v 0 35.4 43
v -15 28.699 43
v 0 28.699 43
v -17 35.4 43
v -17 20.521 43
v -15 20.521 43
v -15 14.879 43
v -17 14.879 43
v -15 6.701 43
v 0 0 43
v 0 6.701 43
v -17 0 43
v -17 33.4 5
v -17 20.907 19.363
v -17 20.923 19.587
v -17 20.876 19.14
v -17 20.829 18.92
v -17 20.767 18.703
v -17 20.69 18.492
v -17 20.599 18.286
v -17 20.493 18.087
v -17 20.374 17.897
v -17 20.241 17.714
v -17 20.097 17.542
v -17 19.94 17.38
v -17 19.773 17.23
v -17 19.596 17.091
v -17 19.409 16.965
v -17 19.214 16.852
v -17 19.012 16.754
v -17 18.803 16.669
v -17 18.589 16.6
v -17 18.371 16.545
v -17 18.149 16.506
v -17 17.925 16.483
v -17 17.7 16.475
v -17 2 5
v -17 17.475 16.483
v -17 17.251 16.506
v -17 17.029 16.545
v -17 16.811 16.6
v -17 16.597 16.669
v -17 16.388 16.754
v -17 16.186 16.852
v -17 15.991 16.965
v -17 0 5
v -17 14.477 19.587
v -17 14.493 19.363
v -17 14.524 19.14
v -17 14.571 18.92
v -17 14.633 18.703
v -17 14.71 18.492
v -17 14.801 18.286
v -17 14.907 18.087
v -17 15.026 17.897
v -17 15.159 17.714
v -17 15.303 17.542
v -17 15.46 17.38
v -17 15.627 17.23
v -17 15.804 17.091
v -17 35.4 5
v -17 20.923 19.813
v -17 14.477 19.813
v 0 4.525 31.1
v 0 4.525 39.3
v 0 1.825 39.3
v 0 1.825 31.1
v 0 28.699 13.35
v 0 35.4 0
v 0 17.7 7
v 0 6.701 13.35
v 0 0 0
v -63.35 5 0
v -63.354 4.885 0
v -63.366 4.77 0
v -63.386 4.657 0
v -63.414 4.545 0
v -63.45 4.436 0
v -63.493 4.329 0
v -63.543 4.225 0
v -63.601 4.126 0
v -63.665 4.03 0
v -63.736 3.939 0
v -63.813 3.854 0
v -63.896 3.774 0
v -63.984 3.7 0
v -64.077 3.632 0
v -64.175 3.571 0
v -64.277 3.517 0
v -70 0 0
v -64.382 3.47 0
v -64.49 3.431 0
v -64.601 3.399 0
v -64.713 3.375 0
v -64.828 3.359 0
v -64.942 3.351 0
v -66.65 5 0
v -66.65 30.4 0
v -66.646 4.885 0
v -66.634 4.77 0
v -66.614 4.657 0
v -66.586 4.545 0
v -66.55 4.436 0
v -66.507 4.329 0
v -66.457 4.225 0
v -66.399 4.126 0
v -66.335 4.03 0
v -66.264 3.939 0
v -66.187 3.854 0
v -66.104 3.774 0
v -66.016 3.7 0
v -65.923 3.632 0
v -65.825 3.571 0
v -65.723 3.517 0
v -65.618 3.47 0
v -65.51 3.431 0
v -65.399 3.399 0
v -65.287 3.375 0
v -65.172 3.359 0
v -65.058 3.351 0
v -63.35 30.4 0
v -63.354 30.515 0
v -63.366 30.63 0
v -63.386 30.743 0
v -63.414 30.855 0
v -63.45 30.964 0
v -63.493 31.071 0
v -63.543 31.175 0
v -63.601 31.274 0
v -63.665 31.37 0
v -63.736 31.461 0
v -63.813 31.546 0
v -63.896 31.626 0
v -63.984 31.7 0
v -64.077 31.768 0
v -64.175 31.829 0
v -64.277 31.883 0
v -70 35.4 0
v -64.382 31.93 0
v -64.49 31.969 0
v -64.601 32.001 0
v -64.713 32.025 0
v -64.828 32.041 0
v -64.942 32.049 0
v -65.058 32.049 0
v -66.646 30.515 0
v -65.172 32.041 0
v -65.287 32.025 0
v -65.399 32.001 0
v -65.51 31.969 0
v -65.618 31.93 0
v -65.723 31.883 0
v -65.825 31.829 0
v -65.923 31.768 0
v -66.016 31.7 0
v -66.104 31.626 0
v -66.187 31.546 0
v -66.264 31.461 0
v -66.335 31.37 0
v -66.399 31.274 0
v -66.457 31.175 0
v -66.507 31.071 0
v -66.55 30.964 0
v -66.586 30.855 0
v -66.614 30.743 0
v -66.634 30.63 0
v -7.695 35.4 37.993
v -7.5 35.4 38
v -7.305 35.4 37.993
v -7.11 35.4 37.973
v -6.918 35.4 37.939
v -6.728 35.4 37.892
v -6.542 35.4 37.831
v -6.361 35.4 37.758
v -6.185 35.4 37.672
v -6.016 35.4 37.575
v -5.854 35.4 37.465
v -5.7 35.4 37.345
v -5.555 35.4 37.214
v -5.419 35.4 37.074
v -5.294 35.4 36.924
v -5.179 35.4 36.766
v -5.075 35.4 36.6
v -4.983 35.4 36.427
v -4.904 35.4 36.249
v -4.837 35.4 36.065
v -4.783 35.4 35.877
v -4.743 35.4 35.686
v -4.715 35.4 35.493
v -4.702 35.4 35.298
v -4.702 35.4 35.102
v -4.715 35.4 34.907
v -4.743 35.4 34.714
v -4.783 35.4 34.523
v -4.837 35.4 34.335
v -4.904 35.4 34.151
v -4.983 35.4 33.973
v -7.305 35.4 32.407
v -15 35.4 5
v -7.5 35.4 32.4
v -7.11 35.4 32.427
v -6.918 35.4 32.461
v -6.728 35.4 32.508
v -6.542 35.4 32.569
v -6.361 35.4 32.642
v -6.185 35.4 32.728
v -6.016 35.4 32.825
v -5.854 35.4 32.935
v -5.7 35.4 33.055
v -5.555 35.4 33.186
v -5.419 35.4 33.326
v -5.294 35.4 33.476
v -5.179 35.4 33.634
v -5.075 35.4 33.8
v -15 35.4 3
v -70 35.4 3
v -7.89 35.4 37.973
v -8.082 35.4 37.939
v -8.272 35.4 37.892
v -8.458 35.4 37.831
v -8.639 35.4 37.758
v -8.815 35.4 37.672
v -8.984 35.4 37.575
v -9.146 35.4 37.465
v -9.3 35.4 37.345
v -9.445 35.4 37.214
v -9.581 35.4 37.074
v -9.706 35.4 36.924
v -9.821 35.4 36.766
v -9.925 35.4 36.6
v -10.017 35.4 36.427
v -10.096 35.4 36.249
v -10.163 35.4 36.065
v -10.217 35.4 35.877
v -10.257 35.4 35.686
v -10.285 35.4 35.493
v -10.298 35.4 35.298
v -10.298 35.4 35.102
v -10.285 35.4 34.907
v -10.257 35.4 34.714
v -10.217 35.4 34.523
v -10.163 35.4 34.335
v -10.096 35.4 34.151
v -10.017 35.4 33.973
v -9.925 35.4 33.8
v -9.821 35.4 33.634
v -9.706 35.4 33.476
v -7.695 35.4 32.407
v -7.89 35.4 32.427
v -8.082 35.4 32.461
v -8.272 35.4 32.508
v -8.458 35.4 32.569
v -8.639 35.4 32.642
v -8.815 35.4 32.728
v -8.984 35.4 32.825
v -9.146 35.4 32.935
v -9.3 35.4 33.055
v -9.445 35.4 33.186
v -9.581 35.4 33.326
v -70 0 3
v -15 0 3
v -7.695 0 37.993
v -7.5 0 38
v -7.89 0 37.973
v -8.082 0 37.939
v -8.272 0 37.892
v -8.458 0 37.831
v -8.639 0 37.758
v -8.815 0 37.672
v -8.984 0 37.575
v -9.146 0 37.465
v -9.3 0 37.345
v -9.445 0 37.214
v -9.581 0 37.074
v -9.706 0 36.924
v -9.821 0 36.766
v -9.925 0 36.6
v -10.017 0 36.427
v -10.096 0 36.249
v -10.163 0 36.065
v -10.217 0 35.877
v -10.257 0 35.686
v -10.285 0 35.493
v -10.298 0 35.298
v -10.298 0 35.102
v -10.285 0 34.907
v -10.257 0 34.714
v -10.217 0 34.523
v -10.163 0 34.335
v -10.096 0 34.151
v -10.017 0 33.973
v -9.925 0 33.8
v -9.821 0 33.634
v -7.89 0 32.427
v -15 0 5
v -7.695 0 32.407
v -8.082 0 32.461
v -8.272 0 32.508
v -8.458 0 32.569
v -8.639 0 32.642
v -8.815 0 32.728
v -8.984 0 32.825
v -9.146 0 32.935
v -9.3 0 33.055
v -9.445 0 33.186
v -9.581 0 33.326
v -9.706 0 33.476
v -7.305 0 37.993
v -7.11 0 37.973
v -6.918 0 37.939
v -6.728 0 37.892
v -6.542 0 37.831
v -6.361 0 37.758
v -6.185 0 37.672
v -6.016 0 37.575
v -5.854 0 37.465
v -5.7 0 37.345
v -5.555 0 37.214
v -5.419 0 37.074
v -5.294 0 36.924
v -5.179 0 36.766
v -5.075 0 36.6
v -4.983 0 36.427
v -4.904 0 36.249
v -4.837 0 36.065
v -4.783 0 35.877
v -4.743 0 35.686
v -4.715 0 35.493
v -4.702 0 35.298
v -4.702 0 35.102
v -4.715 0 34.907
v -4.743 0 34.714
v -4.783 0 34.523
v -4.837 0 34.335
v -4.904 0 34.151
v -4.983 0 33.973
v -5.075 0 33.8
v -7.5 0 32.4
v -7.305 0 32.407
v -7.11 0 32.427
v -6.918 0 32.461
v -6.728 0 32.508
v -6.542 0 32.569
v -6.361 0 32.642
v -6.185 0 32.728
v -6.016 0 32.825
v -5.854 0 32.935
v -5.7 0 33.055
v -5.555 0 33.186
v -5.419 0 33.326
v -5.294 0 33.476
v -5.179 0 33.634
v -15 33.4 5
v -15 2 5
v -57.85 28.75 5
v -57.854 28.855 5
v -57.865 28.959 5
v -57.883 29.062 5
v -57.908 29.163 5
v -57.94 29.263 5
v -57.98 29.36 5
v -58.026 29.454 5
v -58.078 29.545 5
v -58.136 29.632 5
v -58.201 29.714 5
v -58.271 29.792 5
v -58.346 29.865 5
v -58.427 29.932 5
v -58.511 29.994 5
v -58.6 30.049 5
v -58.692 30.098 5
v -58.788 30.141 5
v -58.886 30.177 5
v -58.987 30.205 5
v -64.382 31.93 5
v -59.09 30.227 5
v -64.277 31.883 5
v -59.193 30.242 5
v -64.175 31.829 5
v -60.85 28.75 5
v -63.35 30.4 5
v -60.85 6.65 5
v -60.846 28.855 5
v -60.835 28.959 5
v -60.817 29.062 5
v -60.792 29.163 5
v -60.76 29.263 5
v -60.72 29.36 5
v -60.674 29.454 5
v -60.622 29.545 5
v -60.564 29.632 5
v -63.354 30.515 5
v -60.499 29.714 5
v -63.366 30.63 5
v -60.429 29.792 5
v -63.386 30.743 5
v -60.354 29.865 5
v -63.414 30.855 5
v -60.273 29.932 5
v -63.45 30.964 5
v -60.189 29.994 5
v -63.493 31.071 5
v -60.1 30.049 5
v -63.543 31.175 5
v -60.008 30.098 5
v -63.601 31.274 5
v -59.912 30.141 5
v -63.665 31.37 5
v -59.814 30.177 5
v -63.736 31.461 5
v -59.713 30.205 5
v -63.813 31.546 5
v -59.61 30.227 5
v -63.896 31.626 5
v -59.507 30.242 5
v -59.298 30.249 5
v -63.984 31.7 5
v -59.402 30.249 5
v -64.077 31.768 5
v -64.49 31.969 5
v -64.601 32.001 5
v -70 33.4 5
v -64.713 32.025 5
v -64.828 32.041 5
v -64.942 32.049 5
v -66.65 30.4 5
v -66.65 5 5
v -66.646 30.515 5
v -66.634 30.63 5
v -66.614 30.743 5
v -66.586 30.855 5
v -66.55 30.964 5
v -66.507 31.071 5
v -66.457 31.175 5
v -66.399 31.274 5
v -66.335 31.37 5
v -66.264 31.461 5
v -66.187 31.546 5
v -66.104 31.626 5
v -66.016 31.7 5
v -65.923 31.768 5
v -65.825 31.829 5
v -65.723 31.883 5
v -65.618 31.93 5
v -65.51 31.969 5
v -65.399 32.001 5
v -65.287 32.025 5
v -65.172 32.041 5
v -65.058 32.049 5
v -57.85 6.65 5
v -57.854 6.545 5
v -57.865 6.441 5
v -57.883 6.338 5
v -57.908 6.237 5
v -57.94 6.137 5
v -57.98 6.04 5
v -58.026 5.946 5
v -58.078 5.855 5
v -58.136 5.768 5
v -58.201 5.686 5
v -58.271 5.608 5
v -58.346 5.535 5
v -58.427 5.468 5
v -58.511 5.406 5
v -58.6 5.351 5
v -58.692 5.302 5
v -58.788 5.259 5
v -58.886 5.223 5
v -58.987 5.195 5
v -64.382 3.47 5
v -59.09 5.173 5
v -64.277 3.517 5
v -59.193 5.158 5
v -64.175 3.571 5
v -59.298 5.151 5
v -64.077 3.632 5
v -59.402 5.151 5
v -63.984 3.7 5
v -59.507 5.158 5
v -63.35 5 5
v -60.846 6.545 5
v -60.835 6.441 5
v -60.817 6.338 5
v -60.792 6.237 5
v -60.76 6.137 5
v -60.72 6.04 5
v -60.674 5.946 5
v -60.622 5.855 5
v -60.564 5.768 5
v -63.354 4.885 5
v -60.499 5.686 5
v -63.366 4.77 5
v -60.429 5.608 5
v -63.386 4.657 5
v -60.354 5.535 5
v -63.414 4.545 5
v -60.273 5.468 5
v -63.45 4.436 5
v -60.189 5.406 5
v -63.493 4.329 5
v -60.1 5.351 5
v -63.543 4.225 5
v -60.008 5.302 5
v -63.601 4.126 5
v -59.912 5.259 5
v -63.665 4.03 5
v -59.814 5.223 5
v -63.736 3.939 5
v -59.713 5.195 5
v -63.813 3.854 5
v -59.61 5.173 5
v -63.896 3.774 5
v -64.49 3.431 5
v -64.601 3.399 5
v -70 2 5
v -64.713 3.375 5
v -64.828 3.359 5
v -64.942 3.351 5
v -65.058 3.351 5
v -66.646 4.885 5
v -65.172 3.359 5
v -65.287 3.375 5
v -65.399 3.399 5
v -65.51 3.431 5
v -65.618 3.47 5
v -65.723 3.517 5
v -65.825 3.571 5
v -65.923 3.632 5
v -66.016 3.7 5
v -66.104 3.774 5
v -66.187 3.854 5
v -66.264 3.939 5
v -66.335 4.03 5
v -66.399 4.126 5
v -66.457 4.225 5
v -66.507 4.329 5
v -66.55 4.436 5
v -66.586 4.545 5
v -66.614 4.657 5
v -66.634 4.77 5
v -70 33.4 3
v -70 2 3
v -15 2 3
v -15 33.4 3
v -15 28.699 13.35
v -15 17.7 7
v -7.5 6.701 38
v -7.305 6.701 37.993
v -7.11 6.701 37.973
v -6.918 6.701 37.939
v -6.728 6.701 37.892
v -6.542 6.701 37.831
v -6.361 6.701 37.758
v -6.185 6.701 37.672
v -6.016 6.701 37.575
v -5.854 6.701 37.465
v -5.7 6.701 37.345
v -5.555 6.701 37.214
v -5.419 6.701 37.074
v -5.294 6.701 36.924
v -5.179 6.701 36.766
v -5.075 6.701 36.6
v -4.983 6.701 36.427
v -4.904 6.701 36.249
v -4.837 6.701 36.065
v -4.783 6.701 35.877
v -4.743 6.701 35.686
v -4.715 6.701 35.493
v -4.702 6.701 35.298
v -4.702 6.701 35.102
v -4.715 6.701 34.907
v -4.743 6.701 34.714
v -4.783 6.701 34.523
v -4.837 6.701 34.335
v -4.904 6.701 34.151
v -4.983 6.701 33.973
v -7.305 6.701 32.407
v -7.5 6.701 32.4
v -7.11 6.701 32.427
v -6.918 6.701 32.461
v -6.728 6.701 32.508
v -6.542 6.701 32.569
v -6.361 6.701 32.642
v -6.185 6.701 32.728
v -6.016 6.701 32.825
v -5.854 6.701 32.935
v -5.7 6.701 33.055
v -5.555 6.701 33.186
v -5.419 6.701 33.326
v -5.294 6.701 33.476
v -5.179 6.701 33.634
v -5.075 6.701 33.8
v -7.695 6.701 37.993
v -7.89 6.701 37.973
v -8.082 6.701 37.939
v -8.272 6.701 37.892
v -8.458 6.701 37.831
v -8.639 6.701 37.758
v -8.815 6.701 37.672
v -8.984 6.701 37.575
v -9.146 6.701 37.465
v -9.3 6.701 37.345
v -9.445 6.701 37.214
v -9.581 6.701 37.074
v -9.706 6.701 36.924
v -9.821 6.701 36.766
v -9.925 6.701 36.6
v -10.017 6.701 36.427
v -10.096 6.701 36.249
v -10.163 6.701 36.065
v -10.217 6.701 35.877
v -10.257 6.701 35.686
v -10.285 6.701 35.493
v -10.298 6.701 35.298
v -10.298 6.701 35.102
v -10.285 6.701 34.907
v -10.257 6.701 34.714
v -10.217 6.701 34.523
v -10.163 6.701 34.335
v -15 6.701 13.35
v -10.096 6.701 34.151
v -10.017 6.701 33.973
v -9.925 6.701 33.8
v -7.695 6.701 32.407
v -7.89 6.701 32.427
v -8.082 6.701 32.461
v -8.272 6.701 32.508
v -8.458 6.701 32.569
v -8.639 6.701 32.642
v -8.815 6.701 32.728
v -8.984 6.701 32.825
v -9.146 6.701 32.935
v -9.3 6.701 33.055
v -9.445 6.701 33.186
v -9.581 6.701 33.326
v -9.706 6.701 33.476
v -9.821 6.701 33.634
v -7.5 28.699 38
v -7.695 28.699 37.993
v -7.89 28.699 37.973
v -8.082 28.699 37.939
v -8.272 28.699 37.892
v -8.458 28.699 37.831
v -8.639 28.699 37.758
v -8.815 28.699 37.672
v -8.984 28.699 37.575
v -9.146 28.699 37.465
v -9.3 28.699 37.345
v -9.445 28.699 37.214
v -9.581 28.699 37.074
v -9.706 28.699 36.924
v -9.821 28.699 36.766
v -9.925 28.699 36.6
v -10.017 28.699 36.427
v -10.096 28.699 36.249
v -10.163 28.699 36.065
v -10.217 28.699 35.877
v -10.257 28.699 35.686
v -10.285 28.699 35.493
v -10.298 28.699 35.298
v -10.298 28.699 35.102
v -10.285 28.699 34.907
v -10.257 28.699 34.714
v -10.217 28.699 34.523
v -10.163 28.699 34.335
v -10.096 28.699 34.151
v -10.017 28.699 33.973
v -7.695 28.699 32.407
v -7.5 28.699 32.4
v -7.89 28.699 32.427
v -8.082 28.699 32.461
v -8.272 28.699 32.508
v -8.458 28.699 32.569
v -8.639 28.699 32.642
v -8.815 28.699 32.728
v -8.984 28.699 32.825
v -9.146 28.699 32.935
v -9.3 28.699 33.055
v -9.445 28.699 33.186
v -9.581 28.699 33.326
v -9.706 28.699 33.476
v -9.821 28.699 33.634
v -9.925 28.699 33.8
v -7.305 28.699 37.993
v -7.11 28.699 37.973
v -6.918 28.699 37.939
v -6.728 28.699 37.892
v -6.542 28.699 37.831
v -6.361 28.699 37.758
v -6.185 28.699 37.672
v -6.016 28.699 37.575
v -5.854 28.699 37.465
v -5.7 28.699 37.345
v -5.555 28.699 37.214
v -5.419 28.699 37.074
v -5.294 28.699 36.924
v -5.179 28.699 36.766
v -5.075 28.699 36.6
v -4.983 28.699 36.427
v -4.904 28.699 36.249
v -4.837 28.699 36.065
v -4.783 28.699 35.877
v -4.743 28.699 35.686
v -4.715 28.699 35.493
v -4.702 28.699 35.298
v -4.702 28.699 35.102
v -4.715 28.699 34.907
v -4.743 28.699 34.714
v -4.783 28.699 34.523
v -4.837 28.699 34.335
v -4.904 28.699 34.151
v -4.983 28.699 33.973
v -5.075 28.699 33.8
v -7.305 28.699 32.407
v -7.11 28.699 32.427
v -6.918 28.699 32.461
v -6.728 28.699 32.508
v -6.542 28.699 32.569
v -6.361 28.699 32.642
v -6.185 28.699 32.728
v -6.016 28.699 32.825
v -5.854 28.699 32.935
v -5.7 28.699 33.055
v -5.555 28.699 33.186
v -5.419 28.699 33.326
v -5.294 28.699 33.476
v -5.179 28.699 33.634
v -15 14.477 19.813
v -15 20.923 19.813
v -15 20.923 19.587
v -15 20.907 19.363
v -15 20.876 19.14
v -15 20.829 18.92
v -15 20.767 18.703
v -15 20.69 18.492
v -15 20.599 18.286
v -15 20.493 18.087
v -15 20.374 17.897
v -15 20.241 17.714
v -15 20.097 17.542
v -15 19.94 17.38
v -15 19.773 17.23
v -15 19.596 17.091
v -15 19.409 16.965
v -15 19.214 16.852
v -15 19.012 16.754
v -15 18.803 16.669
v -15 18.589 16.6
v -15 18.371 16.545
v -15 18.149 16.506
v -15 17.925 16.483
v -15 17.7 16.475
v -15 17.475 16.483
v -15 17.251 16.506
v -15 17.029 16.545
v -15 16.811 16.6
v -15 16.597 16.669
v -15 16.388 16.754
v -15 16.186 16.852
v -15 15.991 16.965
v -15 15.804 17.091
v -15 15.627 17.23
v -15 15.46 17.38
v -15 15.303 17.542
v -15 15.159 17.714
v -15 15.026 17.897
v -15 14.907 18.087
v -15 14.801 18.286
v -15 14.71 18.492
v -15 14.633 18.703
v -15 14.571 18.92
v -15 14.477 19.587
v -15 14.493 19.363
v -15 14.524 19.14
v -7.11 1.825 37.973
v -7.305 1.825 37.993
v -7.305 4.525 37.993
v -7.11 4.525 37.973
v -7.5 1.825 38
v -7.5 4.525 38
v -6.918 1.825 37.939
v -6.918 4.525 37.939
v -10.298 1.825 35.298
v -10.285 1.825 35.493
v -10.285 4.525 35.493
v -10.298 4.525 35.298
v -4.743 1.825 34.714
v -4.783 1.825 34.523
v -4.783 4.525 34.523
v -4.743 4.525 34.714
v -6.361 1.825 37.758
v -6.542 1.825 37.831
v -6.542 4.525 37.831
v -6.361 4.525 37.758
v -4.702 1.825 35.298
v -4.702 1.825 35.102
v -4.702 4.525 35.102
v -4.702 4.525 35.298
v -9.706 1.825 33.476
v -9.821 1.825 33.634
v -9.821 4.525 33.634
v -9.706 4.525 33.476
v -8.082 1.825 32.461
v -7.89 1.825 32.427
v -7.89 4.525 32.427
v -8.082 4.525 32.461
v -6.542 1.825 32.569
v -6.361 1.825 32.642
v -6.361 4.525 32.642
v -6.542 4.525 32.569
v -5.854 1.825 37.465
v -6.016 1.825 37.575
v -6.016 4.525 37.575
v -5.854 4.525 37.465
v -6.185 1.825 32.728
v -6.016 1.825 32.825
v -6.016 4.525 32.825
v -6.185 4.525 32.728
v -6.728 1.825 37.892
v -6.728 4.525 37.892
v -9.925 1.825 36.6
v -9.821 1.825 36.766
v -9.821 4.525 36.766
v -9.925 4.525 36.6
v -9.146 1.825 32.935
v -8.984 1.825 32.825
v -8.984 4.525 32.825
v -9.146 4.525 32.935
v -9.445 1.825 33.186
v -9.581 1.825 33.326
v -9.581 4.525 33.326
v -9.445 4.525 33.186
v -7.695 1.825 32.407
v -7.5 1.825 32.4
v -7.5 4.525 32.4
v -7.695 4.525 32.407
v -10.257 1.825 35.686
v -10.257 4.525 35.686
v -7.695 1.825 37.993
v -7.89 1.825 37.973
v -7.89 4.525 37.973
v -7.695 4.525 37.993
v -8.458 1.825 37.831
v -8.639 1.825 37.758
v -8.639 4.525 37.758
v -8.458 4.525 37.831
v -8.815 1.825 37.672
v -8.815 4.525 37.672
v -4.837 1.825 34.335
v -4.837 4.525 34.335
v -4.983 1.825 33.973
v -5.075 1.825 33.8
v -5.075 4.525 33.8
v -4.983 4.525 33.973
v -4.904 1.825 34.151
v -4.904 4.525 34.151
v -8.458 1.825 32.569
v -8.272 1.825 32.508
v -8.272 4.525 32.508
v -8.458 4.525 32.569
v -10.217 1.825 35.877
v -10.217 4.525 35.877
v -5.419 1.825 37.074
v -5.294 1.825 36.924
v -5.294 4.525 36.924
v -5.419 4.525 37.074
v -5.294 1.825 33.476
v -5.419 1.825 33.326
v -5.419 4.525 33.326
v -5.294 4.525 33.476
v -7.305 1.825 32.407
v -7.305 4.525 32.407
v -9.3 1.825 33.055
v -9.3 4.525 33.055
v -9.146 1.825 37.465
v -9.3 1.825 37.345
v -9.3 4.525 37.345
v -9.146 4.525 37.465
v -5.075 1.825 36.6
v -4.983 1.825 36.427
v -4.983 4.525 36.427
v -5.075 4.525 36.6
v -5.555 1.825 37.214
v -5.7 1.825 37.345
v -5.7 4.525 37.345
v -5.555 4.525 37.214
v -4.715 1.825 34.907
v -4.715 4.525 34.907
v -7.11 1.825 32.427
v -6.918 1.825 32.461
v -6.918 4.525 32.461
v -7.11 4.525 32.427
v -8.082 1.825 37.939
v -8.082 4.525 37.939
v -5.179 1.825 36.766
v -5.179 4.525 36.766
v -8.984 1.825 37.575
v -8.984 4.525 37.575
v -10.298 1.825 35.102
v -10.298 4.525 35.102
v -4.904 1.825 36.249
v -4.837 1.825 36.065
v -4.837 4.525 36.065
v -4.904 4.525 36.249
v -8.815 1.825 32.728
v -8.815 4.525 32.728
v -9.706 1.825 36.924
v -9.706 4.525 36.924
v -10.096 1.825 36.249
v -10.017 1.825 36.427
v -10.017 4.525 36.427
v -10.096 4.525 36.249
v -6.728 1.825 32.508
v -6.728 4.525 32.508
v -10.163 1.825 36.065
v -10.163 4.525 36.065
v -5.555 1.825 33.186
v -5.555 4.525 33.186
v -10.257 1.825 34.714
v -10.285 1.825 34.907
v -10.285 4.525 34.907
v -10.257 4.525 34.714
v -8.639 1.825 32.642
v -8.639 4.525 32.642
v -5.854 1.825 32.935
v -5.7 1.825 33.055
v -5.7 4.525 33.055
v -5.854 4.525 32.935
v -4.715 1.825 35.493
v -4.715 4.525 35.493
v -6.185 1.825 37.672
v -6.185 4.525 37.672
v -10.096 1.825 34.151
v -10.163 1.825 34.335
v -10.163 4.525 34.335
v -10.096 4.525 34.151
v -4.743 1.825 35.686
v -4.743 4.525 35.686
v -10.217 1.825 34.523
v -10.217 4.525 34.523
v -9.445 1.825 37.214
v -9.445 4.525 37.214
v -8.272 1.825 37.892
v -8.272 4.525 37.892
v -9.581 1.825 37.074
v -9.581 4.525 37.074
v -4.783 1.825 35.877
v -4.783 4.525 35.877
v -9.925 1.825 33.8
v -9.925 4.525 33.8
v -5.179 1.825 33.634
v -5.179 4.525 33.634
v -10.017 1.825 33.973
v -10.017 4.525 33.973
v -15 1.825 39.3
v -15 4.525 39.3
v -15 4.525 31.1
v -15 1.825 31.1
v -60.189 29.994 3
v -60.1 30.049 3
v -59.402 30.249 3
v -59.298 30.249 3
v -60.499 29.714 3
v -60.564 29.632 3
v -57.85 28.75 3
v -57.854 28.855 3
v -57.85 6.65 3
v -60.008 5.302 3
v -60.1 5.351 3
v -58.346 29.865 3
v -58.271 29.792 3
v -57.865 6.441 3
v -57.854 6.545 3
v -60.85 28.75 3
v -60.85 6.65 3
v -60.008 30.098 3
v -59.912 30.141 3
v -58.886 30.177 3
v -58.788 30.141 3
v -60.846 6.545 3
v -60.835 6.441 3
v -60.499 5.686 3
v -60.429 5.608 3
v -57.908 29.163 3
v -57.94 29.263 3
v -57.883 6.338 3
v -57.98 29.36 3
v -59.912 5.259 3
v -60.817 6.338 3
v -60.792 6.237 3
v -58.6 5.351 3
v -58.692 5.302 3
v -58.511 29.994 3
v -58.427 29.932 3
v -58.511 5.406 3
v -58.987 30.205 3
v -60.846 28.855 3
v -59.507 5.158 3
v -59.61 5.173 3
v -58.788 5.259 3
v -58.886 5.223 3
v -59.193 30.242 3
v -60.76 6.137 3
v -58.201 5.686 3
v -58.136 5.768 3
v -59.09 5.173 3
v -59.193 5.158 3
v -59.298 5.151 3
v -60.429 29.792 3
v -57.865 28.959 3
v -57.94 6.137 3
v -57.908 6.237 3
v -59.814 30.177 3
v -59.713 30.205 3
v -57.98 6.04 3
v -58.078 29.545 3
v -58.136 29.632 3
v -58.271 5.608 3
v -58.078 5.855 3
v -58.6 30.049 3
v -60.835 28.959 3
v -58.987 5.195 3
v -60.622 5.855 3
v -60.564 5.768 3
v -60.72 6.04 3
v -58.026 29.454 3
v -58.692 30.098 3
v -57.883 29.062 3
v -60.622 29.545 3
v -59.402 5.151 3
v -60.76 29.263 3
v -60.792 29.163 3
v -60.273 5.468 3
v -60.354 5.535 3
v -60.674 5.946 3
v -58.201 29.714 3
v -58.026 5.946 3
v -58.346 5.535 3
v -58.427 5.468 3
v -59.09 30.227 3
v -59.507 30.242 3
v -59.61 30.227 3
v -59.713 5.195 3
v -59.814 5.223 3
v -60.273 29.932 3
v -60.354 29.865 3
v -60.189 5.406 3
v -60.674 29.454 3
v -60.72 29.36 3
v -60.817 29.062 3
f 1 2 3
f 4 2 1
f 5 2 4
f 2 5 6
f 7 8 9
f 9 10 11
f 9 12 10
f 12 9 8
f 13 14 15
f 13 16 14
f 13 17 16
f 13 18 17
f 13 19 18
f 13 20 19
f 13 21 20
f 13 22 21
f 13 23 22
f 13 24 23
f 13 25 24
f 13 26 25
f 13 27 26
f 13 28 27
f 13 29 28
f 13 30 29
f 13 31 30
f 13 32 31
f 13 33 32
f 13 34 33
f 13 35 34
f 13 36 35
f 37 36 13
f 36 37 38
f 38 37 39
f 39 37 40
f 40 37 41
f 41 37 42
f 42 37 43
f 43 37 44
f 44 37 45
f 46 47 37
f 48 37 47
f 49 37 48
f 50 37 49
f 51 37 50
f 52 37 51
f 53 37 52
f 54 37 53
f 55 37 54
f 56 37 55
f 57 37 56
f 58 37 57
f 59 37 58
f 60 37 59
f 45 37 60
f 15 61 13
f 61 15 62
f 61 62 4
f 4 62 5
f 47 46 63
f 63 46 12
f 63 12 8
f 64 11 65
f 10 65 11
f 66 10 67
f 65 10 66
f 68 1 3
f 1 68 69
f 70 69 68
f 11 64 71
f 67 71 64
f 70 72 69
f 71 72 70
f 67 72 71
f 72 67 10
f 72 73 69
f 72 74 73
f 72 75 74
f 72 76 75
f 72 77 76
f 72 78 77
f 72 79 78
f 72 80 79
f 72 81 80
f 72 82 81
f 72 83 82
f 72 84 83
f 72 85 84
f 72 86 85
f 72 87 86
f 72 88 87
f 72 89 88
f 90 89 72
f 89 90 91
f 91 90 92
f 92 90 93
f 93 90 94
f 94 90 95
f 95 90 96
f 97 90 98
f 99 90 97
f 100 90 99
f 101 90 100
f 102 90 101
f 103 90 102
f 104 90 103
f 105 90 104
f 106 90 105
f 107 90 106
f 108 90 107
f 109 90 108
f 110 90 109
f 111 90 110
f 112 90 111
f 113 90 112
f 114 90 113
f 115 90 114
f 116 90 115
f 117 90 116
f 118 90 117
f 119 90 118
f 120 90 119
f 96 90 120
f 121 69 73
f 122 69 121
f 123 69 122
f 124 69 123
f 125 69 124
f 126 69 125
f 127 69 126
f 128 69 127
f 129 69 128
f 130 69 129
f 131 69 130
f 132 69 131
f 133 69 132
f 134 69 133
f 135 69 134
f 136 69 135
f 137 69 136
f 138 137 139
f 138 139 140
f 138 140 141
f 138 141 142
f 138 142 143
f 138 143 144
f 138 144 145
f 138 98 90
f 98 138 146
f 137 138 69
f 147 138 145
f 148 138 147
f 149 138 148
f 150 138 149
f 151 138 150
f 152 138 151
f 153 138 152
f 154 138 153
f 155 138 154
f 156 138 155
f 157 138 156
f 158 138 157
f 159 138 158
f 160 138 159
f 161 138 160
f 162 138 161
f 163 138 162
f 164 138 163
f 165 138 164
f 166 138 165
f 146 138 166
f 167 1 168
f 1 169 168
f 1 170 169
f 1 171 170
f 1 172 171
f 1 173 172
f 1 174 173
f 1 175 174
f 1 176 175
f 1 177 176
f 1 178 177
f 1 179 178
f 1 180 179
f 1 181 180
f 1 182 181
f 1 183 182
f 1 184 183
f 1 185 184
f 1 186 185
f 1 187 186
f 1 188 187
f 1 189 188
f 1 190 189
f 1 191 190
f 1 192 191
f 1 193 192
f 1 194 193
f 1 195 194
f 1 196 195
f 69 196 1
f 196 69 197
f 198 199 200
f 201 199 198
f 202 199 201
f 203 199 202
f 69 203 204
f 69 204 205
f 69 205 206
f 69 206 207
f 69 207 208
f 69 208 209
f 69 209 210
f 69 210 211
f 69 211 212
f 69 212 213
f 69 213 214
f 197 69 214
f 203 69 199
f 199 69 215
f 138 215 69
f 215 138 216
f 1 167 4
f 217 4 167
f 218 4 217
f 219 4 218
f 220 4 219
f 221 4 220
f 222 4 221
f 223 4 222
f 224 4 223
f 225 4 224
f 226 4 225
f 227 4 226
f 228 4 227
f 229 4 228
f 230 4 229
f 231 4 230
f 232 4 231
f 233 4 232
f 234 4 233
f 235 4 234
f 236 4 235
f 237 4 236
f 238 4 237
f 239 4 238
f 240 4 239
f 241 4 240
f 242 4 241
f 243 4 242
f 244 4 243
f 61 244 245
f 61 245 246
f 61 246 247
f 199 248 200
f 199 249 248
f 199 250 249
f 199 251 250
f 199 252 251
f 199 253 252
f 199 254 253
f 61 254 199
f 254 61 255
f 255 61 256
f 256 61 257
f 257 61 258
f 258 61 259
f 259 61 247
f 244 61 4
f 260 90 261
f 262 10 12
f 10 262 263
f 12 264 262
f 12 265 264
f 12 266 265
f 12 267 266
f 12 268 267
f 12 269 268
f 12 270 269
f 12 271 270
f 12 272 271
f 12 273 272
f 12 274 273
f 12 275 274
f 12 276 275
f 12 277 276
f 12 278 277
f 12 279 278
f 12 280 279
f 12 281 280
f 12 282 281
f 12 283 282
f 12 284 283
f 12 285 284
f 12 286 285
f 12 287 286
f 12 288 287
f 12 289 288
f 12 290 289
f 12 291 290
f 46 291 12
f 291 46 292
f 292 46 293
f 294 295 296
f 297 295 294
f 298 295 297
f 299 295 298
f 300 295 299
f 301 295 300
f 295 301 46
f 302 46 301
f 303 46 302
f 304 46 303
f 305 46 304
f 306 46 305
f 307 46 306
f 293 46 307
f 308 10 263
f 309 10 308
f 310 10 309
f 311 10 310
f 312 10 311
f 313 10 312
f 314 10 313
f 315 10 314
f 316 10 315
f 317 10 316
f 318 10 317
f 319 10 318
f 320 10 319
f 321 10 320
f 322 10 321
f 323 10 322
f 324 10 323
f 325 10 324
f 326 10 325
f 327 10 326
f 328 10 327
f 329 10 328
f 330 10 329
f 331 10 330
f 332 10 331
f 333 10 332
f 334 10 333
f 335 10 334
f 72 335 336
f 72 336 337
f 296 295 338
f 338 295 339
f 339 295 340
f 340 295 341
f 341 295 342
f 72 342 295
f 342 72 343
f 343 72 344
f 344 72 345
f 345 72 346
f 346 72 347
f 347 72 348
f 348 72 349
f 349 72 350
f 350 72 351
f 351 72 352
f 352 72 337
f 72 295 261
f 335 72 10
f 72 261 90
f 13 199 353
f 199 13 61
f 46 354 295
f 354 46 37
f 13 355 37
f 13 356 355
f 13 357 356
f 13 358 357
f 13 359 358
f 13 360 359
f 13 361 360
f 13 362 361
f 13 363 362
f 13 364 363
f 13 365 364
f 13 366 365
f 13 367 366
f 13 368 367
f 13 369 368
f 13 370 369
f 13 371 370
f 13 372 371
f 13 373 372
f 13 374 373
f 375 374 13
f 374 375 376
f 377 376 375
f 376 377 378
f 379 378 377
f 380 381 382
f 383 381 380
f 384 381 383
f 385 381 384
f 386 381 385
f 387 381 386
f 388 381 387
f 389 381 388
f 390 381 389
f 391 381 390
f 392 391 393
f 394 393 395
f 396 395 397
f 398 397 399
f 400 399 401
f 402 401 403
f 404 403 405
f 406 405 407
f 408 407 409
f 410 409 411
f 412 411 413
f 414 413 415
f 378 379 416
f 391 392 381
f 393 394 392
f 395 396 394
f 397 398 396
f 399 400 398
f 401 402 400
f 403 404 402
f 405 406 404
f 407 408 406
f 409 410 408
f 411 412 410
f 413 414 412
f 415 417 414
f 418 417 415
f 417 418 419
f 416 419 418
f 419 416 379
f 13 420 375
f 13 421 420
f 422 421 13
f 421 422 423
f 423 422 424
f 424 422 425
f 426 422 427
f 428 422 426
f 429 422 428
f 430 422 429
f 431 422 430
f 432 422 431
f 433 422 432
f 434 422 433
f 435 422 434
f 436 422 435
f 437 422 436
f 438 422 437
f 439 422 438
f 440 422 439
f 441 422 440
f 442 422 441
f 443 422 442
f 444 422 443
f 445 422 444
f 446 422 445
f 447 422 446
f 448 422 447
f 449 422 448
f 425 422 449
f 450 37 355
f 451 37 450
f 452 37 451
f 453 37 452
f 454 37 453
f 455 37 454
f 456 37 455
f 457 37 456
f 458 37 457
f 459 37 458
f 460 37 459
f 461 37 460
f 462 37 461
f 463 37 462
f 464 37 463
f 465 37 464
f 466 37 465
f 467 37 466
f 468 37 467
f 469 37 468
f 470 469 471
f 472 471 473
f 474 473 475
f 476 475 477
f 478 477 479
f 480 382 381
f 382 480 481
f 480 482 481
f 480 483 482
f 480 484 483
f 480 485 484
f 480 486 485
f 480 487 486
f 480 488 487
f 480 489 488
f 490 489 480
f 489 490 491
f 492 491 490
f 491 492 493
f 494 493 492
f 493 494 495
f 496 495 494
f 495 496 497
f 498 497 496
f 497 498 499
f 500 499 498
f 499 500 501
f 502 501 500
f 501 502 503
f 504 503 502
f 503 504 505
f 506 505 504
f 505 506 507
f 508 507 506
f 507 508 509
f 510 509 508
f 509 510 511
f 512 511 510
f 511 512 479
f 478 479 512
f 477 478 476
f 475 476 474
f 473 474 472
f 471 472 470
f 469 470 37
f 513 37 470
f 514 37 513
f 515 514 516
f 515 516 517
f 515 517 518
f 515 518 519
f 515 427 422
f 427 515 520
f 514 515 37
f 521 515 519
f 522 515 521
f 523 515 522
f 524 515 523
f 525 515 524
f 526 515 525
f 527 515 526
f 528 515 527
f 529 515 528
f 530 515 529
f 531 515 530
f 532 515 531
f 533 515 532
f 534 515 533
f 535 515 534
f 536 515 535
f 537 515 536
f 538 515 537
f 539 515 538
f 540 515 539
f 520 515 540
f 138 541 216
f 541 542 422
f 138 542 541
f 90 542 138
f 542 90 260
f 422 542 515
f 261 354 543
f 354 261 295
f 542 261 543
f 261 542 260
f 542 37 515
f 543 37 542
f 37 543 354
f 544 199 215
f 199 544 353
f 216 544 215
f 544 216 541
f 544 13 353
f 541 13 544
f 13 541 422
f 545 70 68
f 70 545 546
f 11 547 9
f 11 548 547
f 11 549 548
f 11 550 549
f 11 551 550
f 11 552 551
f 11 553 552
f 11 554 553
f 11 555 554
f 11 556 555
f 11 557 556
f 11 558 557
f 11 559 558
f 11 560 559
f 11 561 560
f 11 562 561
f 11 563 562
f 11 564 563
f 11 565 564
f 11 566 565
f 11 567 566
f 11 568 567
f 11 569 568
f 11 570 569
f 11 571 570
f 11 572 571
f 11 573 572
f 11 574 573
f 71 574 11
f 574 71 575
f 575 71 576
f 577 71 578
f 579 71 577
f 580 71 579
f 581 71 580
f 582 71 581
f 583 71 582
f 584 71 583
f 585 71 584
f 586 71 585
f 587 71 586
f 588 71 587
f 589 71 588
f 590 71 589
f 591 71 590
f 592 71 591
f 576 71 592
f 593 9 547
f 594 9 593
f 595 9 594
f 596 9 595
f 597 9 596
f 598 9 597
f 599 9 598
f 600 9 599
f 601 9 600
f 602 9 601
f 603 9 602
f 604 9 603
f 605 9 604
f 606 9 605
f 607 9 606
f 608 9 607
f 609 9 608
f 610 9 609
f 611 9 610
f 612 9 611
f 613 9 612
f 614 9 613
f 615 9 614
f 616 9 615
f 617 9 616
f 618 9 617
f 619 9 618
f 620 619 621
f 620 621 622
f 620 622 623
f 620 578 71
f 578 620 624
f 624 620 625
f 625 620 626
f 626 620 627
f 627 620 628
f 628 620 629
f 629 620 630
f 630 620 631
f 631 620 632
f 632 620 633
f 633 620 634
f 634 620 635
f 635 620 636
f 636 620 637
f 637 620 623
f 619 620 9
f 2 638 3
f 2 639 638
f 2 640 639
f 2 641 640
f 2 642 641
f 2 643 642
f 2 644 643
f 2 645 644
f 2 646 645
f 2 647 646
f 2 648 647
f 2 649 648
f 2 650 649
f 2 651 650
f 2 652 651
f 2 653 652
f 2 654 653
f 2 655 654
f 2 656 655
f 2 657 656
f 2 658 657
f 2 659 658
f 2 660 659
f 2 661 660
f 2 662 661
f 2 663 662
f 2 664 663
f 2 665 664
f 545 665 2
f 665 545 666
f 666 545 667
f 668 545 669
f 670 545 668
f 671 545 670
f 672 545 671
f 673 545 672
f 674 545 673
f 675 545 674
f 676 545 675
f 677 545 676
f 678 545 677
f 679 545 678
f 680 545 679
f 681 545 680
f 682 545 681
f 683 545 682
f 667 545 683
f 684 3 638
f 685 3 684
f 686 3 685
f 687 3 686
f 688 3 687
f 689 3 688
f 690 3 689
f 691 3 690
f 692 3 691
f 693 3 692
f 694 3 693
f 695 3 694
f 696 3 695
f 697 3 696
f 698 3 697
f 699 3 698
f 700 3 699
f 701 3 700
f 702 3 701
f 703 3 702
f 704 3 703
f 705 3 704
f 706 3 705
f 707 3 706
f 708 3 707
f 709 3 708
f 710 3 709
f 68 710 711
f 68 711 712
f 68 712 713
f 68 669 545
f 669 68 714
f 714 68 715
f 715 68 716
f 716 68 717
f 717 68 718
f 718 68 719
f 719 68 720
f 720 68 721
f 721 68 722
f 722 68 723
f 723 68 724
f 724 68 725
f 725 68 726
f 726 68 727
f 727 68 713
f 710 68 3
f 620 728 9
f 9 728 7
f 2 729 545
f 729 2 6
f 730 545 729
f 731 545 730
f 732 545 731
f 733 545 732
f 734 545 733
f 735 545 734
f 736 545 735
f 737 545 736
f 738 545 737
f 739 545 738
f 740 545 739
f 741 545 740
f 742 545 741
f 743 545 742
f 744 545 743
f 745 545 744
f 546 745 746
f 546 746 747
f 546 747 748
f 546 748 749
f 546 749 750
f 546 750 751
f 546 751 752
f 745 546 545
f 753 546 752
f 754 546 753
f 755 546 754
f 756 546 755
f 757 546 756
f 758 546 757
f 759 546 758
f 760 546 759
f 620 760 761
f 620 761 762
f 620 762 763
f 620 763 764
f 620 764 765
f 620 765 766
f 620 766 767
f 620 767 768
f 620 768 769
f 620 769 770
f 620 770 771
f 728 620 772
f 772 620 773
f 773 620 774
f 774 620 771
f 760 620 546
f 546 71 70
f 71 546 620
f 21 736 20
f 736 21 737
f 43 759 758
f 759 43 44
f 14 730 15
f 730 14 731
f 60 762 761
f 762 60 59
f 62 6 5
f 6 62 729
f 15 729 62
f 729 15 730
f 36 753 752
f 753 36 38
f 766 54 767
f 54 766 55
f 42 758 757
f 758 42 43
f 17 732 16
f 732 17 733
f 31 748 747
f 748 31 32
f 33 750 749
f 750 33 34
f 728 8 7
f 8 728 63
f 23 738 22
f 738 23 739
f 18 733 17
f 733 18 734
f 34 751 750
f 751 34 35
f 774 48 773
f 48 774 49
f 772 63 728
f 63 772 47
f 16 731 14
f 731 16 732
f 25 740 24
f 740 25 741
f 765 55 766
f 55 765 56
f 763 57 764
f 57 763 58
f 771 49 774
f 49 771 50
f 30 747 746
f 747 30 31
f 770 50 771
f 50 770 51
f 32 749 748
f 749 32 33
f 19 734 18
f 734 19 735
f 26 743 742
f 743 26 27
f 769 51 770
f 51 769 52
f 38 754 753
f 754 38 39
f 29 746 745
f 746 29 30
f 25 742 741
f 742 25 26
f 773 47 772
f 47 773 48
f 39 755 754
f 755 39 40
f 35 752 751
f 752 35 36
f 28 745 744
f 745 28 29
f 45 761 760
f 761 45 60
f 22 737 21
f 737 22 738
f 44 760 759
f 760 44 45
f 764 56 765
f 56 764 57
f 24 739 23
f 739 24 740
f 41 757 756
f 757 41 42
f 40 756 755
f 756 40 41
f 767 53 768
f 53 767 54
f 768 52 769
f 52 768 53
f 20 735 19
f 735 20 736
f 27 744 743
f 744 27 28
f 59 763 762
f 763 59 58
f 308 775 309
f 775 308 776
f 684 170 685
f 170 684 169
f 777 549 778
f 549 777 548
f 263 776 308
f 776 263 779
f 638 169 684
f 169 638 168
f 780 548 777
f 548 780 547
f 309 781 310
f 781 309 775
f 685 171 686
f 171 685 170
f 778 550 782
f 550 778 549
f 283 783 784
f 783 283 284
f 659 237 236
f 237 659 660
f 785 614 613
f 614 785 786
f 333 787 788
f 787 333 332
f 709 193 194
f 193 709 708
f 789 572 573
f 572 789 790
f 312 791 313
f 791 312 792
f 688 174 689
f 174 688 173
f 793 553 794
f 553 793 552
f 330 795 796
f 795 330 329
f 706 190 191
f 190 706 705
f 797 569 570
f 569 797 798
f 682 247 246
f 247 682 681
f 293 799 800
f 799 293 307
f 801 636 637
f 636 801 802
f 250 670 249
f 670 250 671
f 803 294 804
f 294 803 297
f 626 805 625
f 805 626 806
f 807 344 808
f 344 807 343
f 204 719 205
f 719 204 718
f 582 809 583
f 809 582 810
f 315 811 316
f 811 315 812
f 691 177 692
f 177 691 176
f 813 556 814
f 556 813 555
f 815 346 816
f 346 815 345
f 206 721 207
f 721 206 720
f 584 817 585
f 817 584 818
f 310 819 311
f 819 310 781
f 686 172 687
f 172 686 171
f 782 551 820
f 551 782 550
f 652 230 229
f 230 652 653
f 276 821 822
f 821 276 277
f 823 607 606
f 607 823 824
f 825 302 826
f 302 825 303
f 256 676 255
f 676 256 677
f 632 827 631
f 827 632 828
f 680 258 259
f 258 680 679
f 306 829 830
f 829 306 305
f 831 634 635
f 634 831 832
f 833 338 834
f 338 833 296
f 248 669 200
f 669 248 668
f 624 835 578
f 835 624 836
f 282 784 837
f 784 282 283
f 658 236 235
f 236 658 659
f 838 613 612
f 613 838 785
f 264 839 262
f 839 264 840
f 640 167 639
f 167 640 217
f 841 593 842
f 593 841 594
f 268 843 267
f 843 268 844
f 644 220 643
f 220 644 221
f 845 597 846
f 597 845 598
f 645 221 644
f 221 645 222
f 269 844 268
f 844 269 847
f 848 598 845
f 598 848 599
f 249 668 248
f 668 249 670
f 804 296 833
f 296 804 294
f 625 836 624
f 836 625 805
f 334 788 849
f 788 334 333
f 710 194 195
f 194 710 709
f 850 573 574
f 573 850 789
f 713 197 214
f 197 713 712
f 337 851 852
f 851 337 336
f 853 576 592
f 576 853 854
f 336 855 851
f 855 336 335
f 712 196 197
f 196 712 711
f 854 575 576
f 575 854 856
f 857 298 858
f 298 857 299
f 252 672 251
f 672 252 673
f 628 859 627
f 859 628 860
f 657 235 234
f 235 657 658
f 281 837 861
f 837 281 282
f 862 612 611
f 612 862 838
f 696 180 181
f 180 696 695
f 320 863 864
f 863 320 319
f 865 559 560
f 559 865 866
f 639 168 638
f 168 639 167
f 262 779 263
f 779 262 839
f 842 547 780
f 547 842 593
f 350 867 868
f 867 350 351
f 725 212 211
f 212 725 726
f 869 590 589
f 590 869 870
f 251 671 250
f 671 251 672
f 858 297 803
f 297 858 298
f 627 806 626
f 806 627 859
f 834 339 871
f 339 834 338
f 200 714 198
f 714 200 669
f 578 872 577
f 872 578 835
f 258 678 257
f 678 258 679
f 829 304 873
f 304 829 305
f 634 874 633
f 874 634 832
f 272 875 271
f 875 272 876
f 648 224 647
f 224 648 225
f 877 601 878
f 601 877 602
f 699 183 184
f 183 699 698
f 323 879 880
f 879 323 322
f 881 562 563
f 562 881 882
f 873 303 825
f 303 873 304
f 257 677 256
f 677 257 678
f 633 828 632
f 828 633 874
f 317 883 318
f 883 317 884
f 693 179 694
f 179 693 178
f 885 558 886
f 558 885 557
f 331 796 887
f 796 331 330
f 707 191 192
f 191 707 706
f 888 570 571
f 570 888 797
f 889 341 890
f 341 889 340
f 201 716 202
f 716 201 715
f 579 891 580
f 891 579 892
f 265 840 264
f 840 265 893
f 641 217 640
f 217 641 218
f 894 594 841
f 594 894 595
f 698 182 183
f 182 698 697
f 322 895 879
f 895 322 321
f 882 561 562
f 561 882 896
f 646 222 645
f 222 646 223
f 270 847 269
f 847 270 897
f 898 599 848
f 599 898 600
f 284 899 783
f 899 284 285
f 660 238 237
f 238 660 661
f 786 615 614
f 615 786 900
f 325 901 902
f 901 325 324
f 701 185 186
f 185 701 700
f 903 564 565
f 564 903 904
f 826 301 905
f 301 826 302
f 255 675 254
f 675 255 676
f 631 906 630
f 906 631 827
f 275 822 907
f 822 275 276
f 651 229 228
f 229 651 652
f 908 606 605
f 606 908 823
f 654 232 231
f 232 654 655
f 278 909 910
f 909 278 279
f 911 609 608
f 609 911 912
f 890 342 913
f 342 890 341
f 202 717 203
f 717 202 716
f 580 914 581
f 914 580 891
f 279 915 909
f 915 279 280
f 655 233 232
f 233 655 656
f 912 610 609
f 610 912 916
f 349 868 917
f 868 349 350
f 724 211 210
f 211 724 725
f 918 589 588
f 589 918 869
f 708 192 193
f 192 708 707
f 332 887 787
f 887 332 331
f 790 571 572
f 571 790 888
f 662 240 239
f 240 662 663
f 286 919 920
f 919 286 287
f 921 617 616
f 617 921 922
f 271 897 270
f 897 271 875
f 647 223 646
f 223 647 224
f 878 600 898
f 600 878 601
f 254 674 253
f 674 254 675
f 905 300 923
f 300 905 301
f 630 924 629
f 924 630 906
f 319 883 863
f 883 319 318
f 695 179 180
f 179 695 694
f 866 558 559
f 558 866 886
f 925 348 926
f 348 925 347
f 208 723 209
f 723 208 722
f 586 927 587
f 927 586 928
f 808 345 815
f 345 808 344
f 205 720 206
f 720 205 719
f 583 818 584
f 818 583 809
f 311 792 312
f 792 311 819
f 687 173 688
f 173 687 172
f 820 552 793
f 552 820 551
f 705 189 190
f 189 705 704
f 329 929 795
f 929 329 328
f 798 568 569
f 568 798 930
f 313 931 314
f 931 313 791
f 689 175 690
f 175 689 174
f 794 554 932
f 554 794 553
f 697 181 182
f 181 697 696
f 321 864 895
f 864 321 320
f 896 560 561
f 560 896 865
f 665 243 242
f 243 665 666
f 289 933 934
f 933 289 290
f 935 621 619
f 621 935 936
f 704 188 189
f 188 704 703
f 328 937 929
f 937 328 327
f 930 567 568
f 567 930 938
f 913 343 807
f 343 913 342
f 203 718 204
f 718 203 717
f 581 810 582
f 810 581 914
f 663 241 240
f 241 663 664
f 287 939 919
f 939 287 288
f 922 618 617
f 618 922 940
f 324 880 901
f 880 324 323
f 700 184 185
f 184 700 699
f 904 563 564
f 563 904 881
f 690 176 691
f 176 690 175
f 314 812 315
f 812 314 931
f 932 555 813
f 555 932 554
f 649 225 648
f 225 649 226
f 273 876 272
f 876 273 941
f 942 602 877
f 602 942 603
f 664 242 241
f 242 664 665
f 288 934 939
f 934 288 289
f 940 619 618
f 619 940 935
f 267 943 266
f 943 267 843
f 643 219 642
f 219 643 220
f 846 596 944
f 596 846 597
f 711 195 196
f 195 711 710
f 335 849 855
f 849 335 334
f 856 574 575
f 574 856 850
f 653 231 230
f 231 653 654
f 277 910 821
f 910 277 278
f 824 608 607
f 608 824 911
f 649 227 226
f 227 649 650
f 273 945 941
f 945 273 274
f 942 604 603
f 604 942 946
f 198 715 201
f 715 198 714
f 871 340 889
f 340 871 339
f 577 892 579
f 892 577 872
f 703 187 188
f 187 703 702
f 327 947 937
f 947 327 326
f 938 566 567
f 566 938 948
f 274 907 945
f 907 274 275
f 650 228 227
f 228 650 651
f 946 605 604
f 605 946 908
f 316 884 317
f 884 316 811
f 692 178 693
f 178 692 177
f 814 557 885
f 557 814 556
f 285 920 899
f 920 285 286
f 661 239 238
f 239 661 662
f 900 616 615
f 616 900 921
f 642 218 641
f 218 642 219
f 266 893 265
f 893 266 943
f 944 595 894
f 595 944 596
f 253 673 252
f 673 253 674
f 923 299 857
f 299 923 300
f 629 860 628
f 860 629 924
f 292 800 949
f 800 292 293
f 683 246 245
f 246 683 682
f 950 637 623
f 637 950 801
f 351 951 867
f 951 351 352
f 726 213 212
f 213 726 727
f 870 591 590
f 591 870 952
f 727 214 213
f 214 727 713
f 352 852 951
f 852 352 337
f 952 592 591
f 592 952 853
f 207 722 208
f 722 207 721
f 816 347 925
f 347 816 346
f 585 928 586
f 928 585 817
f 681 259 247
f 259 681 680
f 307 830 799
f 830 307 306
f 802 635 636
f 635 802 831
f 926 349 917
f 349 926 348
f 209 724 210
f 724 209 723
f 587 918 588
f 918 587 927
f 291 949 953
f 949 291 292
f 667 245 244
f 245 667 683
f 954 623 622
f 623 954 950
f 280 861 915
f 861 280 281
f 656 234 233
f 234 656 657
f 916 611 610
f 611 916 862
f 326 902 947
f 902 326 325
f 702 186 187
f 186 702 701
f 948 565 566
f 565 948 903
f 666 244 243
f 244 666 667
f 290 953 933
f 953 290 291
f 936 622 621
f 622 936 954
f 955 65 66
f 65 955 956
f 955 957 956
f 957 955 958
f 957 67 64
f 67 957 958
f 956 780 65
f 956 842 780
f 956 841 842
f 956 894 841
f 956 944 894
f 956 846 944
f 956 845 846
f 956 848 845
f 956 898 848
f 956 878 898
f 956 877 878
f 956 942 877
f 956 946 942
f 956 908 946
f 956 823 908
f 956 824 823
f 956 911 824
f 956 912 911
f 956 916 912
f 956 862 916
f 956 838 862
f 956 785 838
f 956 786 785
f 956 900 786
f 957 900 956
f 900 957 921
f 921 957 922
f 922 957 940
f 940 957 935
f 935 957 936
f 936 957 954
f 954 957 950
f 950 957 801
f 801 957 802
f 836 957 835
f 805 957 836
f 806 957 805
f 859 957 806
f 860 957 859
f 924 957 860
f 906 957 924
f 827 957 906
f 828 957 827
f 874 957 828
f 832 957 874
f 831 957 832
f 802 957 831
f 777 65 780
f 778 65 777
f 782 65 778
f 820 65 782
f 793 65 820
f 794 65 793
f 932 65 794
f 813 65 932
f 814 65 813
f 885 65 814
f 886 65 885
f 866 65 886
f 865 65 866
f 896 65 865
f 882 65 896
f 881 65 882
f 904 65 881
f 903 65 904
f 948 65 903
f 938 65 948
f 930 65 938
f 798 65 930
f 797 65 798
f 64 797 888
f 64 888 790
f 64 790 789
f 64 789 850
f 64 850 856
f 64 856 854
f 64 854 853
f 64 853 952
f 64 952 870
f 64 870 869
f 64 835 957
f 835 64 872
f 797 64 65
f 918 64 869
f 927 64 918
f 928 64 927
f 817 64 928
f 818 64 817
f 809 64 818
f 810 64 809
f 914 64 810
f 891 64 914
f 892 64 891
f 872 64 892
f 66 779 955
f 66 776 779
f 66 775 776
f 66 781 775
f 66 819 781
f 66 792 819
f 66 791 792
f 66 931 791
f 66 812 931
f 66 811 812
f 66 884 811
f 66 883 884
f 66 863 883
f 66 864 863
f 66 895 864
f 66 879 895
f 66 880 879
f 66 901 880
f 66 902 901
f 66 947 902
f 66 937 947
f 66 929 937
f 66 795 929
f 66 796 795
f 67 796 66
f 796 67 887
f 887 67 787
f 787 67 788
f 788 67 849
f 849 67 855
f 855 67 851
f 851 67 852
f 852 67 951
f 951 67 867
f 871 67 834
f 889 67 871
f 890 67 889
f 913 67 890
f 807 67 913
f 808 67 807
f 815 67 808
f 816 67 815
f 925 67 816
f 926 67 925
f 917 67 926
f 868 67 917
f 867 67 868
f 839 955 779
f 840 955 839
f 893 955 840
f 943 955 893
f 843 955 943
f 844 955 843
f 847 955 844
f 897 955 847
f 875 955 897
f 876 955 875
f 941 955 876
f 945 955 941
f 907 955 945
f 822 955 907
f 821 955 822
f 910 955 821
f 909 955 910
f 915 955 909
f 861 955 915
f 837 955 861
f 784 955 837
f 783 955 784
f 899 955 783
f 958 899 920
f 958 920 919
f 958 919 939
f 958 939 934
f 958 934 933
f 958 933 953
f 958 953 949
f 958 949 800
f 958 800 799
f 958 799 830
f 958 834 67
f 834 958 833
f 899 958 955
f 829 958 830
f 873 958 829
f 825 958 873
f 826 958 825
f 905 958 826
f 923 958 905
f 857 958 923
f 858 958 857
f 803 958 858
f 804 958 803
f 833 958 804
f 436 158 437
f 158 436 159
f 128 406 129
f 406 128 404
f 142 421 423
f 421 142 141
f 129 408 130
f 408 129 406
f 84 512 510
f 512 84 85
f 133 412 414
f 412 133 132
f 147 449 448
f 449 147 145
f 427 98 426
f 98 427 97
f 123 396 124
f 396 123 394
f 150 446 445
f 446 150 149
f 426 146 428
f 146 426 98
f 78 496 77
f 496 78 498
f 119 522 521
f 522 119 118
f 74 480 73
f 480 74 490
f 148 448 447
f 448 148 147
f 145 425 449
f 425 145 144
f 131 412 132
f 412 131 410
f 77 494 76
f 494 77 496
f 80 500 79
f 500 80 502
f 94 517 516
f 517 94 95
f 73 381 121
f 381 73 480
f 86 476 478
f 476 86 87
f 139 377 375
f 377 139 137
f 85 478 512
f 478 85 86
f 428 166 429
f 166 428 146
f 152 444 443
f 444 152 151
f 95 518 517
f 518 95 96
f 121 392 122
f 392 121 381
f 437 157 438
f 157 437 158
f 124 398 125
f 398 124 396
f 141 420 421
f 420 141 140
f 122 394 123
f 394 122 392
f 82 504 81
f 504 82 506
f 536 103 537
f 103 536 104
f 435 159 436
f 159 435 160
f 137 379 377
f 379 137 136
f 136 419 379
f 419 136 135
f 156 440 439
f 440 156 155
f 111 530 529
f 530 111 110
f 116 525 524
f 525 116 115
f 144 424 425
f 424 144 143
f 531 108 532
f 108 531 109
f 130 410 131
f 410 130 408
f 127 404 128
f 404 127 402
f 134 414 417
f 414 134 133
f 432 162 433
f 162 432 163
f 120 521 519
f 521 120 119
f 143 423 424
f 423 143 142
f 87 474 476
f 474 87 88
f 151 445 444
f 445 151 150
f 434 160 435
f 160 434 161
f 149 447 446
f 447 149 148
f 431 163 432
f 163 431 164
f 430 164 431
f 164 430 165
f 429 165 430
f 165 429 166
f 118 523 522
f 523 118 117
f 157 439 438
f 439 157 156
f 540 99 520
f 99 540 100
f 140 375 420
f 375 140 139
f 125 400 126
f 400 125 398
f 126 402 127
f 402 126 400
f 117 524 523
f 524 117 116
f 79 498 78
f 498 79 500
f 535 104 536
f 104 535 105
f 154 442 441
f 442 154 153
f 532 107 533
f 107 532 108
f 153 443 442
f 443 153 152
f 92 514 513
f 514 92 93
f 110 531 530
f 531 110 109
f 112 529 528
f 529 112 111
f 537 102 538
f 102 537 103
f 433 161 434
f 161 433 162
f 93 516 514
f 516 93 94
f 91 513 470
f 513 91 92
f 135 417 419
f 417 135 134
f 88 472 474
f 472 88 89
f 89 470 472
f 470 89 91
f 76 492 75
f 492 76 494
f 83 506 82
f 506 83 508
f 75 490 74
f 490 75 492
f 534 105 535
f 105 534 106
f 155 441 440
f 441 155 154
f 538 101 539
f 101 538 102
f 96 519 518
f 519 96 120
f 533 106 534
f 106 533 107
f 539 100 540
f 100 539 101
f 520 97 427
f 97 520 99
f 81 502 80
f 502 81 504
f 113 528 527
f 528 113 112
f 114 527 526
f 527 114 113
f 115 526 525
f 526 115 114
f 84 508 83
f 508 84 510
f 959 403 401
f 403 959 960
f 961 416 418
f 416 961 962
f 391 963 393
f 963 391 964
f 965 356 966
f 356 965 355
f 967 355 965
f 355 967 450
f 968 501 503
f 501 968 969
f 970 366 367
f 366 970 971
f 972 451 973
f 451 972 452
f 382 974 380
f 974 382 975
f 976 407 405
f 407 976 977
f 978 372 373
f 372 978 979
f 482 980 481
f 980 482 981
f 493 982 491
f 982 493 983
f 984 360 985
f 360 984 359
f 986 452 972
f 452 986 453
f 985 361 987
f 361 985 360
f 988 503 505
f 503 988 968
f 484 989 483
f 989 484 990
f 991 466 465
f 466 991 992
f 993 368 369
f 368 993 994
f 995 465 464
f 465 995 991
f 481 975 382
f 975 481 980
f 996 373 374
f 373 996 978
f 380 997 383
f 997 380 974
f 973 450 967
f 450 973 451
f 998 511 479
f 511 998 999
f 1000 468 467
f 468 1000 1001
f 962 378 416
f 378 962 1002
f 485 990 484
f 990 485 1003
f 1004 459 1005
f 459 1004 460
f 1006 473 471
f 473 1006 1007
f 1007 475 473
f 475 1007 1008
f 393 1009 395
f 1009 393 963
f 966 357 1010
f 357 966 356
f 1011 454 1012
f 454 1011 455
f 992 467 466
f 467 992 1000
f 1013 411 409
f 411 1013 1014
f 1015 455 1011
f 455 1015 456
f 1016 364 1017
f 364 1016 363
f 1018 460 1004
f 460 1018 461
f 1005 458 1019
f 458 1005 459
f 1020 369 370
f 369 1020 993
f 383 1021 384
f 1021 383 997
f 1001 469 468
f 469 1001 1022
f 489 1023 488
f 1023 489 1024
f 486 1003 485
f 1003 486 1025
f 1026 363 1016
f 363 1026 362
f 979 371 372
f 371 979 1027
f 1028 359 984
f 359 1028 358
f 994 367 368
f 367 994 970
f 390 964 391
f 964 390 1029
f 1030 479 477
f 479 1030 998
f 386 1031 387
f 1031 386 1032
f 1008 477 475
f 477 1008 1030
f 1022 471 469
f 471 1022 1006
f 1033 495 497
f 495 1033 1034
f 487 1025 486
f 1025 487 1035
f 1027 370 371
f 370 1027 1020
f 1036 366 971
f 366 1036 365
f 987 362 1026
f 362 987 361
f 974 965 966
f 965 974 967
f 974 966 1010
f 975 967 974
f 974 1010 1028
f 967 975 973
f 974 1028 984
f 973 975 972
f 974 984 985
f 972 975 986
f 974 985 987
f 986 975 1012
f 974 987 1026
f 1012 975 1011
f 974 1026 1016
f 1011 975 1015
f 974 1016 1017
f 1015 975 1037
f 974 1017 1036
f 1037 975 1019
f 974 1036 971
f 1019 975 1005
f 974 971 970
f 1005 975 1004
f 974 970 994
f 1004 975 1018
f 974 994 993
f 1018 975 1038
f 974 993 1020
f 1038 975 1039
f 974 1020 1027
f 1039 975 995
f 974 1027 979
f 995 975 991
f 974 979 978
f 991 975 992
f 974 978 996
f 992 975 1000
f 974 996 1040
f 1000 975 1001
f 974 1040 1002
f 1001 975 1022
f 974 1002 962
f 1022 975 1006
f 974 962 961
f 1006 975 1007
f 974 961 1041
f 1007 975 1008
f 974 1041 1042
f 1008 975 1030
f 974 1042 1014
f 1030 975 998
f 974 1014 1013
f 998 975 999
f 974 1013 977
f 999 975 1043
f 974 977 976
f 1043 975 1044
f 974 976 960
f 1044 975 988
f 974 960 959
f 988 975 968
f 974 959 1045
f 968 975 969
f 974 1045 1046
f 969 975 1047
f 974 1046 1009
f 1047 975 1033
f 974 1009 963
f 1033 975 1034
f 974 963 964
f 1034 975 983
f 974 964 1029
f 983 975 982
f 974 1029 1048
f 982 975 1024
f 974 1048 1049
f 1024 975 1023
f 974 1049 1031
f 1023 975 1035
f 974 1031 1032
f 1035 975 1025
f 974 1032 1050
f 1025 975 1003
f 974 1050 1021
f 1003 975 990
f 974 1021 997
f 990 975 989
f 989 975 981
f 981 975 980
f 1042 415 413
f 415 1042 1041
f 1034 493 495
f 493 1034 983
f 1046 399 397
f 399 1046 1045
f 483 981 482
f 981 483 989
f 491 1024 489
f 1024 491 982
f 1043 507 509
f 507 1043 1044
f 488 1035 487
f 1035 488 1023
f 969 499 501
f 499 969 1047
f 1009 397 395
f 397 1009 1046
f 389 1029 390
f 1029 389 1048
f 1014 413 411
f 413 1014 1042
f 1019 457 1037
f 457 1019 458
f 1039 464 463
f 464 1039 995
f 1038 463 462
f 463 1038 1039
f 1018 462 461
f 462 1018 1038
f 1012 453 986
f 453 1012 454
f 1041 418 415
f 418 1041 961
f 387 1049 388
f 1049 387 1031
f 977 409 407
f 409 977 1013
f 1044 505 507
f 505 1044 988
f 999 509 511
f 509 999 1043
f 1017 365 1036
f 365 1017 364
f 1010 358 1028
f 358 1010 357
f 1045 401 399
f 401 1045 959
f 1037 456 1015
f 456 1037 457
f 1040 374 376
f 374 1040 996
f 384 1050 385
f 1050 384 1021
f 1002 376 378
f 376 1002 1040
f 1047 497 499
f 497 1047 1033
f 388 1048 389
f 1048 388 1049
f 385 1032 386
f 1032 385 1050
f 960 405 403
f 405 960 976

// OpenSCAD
height = 70;
spindlePortionHeight = 15;
coletteHolderClearance = 2;//6;
spindleShaftDiameter = 25.4;//14.5;
holeSpacing = 19;
insetDepth = 2;
insetHeight = 3;
insetOffsetFromHoles = 4;
separation = 1;
m3 = 3.3;
m3NutWidth = 5.7;
m3nutHeight = 2;
wallThickness = 5;
sideCutoff = 3;

m5 = 5.6;
m5NutWidth = 8.2;
m5NutHeight = 2.7;

probeOffset = 5;

sides = 6;
lipHeight = 2;
lipMinDiameter = 25.4/4 +0.1;

length = 2*wallThickness+max(holeSpacing,spindleShaftDiameter);
rotate([0,-90,0])
difference() {
    union() {
        cube([wallThickness+coletteHolderClearance+spindleShaftDiameter+wallThickness+m5, length,spindlePortionHeight+lipHeight]);
        cube([wallThickness, length,height]);
    }
    hull() {
        translate([wallThickness+coletteHolderClearance+spindleShaftDiameter/2,length/2,0])
            cylinder(r=spindleShaftDiameter/2, h=spindlePortionHeight, $fn=sides);
        translate([wallThickness+coletteHolderClearance+spindleShaftDiameter+wallThickness+m5,length/2,0])
            cylinder(r=spindleShaftDiameter/2, h=spindlePortionHeight, $fn=sides);
    }
    hull() {
        translate([wallThickness+coletteHolderClearance+spindleShaftDiameter/2,length/2,0])
            cylinder(r=lipMinDiameter/2, h=spindlePortionHeight+lipHeight, $fn=90);
        translate([wallThickness+coletteHolderClearance+spindleShaftDiameter+wallThickness+m5,length/2,0])
            cylinder(r=lipMinDiameter/2, h=spindlePortionHeight+lipHeight, $fn=sides);
    }
    translate([wallThickness+coletteHolderClearance+spindleShaftDiameter+m5/2,0,spindlePortionHeight/2]) rotate([-90,0,0]) {
        cylinder(r=m5/2,h=length,$fn=90);
    }
    translate([wallThickness+coletteHolderClearance+spindleShaftDiameter+m5/2-m5NutWidth/2,(length-spindleShaftDiameter)/4-m5NutHeight/4,0])
        cube([m5NutWidth,m5NutHeight,spindlePortionHeight]);
    hull() {
        translate([0,wallThickness,height-probeOffset]) rotate([0,90,0])
            cylinder(r=m3/2,h=length,$fn=90);
        translate([0,length-wallThickness,height-probeOffset]) rotate([0,90,0])
            cylinder(r=m3/2,h=length,$fn=90);
    }
    hull() {
        translate([wallThickness-insetDepth,wallThickness+m3/2,height-probeOffset-insetOffsetFromHoles-m3/2]) rotate([0,90,0])
            cylinder(r=insetHeight/2,h=insetDepth,$fn=90);
        translate([wallThickness-insetDepth,length-wallThickness-m3/2,height-probeOffset-insetOffsetFromHoles-m3/2]) rotate([0,90,0])
            cylinder(r=insetHeight/2,h=insetDepth,$fn=90);
    }
    
    translate([wallThickness-insetDepth,0,spindlePortionHeight]) {
        cube([insetDepth, wallThickness-sideCutoff,height]);
        translate([0,length-wallThickness+sideCutoff,0])
            cube([insetDepth, wallThickness-sideCutoff,height]);
    }
}
